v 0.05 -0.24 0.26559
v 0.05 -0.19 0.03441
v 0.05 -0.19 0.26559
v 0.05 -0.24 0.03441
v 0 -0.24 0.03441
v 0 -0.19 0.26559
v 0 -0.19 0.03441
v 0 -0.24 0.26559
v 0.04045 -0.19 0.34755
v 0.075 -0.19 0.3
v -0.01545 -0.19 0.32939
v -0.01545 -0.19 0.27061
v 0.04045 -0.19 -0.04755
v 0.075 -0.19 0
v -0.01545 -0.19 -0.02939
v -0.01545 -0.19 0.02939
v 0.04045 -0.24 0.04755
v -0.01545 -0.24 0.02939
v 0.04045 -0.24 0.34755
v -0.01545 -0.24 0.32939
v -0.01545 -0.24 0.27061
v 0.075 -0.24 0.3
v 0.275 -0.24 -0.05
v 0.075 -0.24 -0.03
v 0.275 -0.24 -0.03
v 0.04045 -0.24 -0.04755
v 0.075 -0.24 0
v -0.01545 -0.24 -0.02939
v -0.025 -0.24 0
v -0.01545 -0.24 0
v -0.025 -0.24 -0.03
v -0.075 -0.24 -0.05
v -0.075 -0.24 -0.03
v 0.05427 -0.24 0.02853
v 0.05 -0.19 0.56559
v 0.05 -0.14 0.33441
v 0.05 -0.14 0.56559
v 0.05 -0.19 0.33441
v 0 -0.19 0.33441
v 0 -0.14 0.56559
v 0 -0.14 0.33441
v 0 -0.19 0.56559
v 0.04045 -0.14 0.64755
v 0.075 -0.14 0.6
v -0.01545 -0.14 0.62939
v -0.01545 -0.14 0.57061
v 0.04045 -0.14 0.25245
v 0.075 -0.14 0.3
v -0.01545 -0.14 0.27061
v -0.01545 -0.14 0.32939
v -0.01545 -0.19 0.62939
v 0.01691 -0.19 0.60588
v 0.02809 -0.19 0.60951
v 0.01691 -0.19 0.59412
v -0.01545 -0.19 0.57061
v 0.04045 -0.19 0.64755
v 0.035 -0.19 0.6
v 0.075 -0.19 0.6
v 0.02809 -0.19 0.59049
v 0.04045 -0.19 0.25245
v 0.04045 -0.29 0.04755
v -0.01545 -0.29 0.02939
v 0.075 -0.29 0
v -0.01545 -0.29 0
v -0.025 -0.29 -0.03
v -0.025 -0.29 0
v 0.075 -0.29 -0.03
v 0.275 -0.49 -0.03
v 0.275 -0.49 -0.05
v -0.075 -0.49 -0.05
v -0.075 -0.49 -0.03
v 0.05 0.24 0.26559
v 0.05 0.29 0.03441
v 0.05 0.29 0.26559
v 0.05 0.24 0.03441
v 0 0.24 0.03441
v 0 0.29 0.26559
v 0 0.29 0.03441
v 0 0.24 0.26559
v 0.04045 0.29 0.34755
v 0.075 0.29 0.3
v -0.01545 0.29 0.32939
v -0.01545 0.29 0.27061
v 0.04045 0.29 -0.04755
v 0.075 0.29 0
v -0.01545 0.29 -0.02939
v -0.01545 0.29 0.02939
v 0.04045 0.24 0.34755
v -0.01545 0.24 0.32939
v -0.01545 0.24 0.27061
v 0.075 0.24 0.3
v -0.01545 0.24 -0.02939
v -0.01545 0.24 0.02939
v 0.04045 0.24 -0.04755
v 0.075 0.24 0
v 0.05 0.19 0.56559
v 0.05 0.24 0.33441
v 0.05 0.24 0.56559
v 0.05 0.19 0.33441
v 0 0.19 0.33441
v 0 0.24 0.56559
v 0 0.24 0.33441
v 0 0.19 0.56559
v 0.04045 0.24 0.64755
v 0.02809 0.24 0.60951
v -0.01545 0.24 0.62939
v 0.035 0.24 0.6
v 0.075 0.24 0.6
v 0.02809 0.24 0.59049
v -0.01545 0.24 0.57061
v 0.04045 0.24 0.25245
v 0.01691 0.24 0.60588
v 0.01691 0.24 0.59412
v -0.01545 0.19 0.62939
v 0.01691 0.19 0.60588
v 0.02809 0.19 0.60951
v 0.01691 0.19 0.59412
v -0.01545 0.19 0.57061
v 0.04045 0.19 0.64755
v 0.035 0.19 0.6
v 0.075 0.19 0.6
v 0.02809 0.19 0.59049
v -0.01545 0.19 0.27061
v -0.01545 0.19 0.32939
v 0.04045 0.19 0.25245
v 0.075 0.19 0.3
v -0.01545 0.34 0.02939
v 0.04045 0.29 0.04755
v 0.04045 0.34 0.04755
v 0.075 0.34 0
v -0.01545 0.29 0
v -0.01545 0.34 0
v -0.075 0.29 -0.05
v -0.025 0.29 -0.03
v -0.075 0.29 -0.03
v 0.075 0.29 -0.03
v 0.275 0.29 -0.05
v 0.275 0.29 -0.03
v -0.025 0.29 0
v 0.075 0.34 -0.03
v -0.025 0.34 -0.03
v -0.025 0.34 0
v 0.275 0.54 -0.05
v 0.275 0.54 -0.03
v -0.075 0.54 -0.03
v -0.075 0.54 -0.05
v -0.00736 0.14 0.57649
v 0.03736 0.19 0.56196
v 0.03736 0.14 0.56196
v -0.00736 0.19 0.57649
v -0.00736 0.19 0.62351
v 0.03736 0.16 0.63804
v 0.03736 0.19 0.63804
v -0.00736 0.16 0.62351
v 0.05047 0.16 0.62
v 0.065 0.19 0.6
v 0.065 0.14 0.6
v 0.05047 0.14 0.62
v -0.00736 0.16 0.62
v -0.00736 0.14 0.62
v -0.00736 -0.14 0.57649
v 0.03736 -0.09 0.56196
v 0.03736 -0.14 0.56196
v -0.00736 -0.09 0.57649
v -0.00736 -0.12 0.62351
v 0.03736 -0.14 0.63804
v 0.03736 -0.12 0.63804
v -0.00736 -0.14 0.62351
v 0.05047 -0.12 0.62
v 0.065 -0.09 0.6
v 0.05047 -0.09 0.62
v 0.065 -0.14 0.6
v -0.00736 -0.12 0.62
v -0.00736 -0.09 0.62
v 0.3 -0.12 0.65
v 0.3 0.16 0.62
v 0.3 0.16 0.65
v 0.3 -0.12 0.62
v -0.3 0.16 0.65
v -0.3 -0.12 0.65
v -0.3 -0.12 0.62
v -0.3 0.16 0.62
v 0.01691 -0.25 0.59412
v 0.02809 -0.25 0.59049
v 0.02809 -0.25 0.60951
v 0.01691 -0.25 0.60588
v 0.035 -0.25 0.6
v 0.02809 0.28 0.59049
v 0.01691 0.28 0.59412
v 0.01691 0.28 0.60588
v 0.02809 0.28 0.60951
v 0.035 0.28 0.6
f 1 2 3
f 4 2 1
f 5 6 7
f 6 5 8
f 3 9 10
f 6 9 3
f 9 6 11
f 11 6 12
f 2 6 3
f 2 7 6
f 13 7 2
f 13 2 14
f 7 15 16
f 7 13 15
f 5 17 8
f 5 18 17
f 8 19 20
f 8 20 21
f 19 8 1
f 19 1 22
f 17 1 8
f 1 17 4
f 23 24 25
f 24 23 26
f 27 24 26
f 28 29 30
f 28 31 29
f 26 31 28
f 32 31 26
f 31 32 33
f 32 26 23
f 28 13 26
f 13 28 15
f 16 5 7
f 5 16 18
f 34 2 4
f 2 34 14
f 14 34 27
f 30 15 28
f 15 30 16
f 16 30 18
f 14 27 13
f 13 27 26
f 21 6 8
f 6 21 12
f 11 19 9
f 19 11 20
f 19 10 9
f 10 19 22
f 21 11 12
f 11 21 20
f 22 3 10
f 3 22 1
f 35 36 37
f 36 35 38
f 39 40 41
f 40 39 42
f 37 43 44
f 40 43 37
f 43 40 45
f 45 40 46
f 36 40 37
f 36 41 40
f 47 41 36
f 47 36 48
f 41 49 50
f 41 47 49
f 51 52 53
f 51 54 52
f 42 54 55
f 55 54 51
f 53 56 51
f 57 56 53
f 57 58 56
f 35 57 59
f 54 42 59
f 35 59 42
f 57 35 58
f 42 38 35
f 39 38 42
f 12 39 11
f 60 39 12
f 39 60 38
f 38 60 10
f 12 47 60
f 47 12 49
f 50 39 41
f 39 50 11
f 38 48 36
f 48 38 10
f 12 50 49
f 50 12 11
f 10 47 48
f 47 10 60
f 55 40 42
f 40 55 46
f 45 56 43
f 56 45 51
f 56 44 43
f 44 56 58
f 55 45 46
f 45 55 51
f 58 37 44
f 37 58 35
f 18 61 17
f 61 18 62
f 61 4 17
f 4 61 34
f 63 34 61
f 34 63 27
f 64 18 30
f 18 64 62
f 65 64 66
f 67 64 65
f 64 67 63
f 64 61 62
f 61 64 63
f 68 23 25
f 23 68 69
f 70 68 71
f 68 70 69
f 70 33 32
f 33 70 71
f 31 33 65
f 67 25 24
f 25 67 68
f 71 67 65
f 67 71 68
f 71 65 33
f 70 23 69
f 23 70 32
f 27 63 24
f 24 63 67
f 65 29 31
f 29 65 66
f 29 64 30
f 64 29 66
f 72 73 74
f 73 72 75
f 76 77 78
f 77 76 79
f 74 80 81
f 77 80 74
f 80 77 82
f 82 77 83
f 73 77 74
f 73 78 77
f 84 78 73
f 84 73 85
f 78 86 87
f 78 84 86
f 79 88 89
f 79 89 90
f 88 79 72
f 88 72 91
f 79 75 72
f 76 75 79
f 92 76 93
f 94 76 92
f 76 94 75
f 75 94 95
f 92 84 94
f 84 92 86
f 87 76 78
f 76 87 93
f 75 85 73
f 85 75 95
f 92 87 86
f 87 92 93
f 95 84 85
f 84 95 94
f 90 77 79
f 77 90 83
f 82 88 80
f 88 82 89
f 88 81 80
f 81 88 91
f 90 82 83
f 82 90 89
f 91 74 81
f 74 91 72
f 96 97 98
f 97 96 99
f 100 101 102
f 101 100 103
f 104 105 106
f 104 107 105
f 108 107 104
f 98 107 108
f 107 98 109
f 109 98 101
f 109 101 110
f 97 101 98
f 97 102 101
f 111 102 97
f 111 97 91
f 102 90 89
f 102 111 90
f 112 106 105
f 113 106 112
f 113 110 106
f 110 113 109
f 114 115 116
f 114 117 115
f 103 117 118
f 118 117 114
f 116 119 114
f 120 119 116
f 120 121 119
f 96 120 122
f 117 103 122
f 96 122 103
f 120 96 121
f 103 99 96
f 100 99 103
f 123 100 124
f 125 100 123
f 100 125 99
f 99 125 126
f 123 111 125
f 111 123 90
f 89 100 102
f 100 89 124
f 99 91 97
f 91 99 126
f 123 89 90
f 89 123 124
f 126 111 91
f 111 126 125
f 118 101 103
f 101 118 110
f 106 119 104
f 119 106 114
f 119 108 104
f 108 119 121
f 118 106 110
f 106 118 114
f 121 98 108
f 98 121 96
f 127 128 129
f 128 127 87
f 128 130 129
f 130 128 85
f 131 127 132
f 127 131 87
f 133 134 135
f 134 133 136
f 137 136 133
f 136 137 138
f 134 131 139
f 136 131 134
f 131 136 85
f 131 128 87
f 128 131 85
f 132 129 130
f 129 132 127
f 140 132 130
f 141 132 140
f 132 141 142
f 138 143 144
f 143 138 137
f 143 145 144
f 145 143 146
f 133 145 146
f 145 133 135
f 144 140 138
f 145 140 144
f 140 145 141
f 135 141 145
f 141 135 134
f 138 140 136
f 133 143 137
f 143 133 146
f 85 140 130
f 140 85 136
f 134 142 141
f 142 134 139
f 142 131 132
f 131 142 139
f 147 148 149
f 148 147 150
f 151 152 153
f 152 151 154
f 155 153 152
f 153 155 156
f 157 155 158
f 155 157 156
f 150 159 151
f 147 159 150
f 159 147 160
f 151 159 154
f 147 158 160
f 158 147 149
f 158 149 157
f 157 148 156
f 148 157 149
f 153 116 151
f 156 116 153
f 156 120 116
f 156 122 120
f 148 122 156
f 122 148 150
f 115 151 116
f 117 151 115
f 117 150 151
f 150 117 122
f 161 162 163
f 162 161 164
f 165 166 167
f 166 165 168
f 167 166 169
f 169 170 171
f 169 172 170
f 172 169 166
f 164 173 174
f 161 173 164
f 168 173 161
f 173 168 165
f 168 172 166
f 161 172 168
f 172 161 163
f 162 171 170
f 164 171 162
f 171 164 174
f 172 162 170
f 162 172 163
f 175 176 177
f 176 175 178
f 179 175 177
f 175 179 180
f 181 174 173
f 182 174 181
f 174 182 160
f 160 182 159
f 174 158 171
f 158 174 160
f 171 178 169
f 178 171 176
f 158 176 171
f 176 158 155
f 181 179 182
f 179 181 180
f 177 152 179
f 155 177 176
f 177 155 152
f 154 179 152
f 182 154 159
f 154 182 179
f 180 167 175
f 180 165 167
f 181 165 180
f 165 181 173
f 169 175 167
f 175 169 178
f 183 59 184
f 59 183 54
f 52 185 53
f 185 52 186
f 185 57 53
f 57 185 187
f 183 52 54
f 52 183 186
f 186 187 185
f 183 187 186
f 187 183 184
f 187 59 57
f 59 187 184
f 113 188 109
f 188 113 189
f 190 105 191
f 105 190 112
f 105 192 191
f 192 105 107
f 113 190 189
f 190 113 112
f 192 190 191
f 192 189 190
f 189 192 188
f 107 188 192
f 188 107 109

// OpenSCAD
// CSG.scad - Basic example of CSG usage

//rightfemur
translate([0,-0.24,0])
{
    color([1,0,0])
    union() {
     cube([0.05,0.05,0.30]);

    rotate([90,0,0]) {
        translate([0.025,0,-0.025]) {
        cylinder(h=0.05,r=0.05,center=true);
        }
        }


    rotate([90,0,0]) {
        translate([0.025,0.30,-0.025]) {
        cylinder(h=0.05,r=0.05,center=true);
        }
        }

}
}

//rightthigh
translate([0,-0.19,0.30])
{
    color([1,0,0])
    union() {
    cube([0.05,0.05,0.30]);

    rotate([90,0,0]) {
        translate([0.025,0,-0.025]) {
        cylinder(h=0.05,r=0.05,center=true);
        }
        }


    rotate([90,0,0]) {
        translate([0.025,0.30,-0.025]) {
        cylinder(h=0.05,r=0.05,center=true);
        }
        }
    }
}

///rightfoot
translate ([0.025,-0.24,0])
{
    color([0,0,1])
    rotate([90,0,0]) {
    union()
    {
        cylinder(h=0.05,r=0.05);
        translate([-0.10,-0.05,0]) {
        cube([0.35,0.02,0.25]);
        }
        translate([-0.05,-0.05,0]) {
            cube([0.10,0.05,0.05]);
        }
    }
}
}


//leftfemur
translate([0,0.24,0])
{
    color([0,1,0])
    union() {
    cube([0.05,0.05,0.30]);

    rotate([90,0,0]) {
        translate([0.025,0,-0.025]) {
        cylinder(h=0.05,r=0.05,center=true);
        }
        }


    rotate([90,0,0]) {
        translate([0.025,0.30,-0.025]) {
        cylinder(h=0.05,r=0.05,center=true);
        }
        }
    }
}

//leftthigh
translate([0,0.19,0.30])
{

    union() {
    cube([0.05,0.05,0.30]);

    rotate([90,0,0]) {
        translate([0.025,0,-0.025]) {
        cylinder(h=0.05,r=0.05,center=true);
        }
        }


    rotate([90,0,0]) {
        translate([0.025,0.30,-0.025]) {
        cylinder(h=0.05,r=0.05,center=true);
        }
        }
    }
}

//leftfoot
translate ([0.025,0.34,0])
{
    color([0,1,0])
    rotate([90,0,0]) {
    union()
    {
        cylinder(h=0.05,r=0.05);
        translate([-0.10,-0.05,-0.20]) {
        cube([0.35,0.02,0.25]);
        }
        translate([-0.05,-0.05,0]) {
            cube([0.10,0.05,0.05]);
        }
    }
}
}

//hip
translate([0,-0.01,0])
{
    color([0.3,0.3,0.5])
    union()
    {
        translate([0.025,0.20,0.60])
        {
            rotate([90,0,0])
            {
                cylinder(h=0.05,r=0.04);
            }
        }
        translate([0.025,-0.08,0.60])
        {
            rotate([90,0,0])
            {
                cylinder(h=0.05,r=0.04);
            }
        }
        translate([-0.30,-0.11,0.62])
        {
            cube([0.60,0.28,0.03]);
        }

    }

}

//join: hip,rightthigh
translate([0.025,-0.15,0.60])
{
    color([0.5,0.5,0.5]);
    union()
    {
        translate([0.0,0.0,0.0])
        {
            rotate([90,0,0])
            {
                cylinder(h=0.1,r=0.01);
            }
        }
    }
}

//join: hip,leftthigh
translate([0.025,0.28,0.60])
{
   color([0.5,0.5,0.5]);
    union()
    {
        translate([0.0,0.0,0.0])
        {
            rotate([90,0,0])
            {
                cylinder(h=0.1,r=0.01);
            }
        }
    }
}

//join: rightthigh,rightfemur
//join: leftthigh,leftfemur
//join: rightfemur,rightfoot
//join: leftfemur,leftfoot
